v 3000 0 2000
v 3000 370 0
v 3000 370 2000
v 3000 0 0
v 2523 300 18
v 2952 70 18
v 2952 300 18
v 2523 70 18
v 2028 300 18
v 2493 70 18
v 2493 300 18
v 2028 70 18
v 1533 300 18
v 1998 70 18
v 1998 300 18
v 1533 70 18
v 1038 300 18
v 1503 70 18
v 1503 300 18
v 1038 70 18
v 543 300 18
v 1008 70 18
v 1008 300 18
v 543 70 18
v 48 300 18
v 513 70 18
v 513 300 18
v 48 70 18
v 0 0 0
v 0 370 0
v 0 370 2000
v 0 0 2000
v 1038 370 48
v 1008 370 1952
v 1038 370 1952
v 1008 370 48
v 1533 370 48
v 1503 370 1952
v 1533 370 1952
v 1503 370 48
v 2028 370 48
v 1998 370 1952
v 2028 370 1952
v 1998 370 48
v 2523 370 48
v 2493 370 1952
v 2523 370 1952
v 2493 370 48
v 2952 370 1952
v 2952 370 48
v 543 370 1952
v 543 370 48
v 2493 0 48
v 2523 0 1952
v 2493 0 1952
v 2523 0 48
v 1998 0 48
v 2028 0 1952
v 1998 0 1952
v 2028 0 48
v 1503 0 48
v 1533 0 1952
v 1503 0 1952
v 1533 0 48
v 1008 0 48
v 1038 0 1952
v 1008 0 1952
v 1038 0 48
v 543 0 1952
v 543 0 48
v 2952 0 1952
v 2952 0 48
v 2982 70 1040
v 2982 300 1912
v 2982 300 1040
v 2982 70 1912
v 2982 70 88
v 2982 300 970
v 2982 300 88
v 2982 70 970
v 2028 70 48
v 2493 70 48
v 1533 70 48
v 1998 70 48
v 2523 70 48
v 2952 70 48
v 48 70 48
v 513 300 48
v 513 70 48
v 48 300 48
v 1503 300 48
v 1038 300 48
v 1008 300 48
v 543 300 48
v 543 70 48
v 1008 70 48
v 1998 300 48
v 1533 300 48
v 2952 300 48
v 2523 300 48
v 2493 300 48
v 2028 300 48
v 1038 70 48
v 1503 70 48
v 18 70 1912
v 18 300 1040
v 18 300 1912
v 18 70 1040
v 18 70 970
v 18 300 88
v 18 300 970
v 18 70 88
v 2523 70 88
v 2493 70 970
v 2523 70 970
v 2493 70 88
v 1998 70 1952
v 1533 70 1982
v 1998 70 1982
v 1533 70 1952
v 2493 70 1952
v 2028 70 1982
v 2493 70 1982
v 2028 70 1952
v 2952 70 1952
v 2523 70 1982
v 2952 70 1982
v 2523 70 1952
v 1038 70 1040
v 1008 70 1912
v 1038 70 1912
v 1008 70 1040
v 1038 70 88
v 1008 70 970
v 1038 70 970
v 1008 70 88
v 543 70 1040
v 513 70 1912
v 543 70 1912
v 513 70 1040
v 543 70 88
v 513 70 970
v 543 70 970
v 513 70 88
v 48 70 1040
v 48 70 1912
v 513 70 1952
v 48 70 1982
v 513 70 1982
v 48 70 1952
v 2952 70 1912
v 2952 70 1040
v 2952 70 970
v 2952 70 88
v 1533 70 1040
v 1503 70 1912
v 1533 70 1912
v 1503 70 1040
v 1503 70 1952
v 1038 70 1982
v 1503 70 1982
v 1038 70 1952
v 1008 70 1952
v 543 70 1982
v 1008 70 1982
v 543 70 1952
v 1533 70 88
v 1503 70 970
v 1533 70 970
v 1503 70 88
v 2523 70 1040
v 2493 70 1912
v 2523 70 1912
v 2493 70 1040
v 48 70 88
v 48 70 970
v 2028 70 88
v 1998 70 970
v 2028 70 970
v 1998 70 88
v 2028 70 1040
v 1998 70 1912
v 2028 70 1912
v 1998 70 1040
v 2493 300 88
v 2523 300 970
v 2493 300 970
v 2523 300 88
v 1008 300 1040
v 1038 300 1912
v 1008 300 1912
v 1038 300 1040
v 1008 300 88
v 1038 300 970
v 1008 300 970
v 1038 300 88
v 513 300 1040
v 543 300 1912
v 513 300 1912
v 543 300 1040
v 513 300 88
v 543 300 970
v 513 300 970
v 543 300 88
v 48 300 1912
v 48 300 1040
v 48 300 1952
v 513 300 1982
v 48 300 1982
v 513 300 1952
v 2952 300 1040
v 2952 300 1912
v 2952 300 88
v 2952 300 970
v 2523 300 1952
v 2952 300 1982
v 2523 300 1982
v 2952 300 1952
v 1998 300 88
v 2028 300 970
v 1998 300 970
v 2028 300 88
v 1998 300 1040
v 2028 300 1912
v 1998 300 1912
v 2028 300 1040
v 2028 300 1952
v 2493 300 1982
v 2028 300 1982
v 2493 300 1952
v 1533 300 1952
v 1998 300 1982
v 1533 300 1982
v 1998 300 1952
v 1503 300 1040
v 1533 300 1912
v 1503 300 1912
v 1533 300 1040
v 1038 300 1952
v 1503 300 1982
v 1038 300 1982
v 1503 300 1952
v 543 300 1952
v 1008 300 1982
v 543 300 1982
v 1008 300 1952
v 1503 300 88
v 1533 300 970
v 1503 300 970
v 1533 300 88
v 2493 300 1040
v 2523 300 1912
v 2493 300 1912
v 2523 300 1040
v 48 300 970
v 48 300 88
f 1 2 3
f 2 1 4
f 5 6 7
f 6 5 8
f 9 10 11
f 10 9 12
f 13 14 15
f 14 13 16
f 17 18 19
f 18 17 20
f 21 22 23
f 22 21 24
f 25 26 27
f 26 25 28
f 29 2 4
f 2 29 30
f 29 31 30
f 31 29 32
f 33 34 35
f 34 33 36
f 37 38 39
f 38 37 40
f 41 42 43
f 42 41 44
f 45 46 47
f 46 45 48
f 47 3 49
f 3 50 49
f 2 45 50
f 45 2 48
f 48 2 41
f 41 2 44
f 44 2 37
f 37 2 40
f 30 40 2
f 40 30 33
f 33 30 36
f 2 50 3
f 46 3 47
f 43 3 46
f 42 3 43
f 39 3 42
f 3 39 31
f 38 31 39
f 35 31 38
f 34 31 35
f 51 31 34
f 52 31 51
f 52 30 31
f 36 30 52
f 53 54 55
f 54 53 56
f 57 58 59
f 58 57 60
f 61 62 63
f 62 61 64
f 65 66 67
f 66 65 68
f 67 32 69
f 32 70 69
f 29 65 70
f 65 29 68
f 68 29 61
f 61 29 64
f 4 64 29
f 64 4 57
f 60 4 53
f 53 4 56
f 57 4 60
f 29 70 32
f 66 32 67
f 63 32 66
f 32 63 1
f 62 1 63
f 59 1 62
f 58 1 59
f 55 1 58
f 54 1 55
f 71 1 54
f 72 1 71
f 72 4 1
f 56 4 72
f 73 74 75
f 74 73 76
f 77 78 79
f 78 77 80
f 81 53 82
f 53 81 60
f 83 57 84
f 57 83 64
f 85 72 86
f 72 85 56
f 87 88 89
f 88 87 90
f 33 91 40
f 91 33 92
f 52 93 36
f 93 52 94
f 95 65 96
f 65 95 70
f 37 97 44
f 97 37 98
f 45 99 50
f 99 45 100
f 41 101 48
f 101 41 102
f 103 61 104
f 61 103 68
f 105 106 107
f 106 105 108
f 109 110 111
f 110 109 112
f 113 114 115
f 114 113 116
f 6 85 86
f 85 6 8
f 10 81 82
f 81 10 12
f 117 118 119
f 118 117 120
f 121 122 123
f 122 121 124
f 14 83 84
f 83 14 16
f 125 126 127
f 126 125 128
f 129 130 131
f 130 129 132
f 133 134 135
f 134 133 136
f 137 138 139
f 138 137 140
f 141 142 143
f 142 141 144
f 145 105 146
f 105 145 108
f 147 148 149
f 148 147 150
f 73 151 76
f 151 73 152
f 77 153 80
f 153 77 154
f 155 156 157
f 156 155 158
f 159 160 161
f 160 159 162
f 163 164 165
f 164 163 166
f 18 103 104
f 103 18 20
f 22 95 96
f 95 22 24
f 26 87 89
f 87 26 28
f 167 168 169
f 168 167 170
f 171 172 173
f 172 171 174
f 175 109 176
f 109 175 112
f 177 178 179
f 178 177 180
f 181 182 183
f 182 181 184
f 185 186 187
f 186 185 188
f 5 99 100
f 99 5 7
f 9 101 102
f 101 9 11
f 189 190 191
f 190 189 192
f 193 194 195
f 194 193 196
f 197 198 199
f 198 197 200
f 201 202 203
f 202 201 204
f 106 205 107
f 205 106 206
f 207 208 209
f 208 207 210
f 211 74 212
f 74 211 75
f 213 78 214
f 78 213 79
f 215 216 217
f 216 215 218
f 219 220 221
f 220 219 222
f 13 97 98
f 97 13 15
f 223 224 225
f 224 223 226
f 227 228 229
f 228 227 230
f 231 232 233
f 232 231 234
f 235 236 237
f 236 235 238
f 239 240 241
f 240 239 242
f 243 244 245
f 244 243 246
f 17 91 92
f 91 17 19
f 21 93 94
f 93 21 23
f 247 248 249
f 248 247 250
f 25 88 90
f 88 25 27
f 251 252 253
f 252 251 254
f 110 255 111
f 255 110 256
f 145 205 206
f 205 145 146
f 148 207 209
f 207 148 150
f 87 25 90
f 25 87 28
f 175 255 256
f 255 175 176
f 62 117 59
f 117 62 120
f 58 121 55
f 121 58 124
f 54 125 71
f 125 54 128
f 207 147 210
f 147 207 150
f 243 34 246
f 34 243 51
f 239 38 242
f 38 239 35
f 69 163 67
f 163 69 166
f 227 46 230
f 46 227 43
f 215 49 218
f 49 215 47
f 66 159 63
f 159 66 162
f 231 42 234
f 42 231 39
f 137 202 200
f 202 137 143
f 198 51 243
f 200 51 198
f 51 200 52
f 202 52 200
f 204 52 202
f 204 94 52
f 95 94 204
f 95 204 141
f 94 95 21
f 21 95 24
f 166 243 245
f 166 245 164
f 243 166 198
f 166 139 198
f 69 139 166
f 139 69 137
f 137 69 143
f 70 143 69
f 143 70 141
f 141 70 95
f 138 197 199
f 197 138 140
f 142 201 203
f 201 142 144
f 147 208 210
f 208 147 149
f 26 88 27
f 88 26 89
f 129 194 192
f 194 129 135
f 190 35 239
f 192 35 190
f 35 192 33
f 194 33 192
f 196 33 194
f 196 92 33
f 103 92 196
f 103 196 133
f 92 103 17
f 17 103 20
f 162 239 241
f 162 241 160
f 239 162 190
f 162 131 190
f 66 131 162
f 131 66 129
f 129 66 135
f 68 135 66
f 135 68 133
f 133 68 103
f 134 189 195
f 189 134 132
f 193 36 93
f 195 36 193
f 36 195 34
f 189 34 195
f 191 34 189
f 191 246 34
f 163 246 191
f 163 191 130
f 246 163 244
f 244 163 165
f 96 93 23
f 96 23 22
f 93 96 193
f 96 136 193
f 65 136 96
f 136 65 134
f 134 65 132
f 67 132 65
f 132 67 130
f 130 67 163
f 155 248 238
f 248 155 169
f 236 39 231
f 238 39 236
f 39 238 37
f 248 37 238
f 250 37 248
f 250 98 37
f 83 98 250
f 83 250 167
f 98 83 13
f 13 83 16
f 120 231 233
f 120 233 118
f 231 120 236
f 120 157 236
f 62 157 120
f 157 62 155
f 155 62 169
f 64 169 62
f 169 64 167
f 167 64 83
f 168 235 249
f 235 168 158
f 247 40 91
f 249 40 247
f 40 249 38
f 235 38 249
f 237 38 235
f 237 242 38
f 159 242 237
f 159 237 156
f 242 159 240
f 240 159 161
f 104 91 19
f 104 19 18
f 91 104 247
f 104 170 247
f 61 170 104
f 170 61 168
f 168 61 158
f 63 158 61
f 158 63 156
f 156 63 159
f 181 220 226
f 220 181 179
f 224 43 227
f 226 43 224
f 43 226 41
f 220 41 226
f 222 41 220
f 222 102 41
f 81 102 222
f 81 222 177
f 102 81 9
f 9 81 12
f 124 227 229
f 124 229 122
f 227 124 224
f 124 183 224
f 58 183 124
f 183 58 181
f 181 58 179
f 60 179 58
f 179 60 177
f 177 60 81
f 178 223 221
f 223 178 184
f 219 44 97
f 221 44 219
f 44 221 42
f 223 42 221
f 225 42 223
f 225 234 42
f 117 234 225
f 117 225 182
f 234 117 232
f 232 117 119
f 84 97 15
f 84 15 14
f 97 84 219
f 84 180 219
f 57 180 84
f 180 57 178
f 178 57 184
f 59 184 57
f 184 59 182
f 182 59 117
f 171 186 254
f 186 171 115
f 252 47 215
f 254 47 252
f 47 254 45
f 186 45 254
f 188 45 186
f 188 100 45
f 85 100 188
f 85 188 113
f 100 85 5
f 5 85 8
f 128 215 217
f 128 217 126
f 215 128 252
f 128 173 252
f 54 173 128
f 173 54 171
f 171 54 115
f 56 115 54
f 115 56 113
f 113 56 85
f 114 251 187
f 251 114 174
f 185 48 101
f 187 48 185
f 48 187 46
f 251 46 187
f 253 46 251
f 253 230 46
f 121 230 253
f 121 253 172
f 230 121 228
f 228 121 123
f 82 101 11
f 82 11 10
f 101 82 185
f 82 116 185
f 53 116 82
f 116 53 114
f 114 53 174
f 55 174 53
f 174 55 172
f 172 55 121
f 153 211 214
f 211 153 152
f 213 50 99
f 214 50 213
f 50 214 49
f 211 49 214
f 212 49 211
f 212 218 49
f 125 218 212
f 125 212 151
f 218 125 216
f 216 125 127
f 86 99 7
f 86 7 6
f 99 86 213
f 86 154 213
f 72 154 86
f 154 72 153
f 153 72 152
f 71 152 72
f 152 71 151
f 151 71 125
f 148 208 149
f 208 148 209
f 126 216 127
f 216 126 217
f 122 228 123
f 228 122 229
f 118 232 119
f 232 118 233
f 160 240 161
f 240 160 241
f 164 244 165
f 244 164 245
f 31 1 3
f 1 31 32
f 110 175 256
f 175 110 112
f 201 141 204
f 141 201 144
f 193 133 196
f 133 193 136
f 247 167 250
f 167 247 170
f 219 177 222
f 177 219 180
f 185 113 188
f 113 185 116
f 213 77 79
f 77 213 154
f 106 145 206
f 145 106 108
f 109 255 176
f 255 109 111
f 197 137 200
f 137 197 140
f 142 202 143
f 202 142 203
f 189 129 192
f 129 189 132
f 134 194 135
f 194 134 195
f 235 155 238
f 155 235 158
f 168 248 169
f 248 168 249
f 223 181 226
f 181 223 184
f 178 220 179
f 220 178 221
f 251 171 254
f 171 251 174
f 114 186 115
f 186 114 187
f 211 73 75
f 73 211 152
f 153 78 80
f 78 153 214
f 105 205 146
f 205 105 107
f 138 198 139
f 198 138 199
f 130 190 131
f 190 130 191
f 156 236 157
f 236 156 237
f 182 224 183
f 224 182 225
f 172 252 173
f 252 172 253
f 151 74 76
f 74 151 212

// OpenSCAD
// Archiyou -> OpenSCAD  |  script: strawwall  |  units: mm
// OpenSCAD has no units: coordinates are in mm.
// Parts: 48 CSG, 0 baked, 0 2D
// Skipped: gridline (open curve), gridline11 (open curve), gridline21 (open curve), gridline31 (open curve), gridline41 (open curve), gridline51 (open curve), gridline61 (open curve), gridline71 (open curve)
// Parameters at export, for reference only (nothing in this file is linked to them):
//   LENGTH = 300
//   HEIGHT = 200
//   SYSTEM = "RFCP-2"
//   BALE_THICKNESS = 370
//   BALE_WIDTH = 470
//   BALE_LENGTH = 600
//   BEAM_SECTION_AUTO = true
//   BEAM_SECTION_WIDTH = 35
//   BEAM_SECTION_HEIGHT = 70
//   HIDE_BALES = false

$fn = 32;
PART = "";

// bottom board  (layer bottomplate)
module bottom_board() {
    color([0.647, 0.165, 0.165]) translate([1500, 185, 9]) cube([3000, 370, 18], center = true);
}

// bottom plate  (layer bottomplate)
module bottom_plate() {
    color([0, 0.502, 0]) translate([1500, 35, 33]) cube([2964, 70, 30], center = true);
}

// bottom plate back  (layer bottomplate)
module bottom_plate_back() {
    color([0, 0.502, 0]) translate([1500, 335, 33]) cube([2964, 70, 30], center = true);
}

// stud11  (layer studs)
module stud11() {
    color([0, 0, 1]) translate([33, 35, 1000]) cube([30, 70, 1904], center = true);
}

// stud21  (layer studs)
module stud21() {
    color([0, 0, 1]) translate([528, 35, 1000]) cube([30, 70, 1904], center = true);
}

// stud31  (layer studs)
module stud31() {
    color([0, 0, 1]) translate([1023, 35, 1000]) cube([30, 70, 1904], center = true);
}

// stud41  (layer studs)
module stud41() {
    color([0, 0, 1]) translate([1518, 35, 1000]) cube([30, 70, 1904], center = true);
}

// stud51  (layer studs)
module stud51() {
    color([0, 0, 1]) translate([2013, 35, 1000]) cube([30, 70, 1904], center = true);
}

// stud61  (layer studs)
module stud61() {
    color([0, 0, 1]) translate([2508, 35, 1000]) cube([30, 70, 1904], center = true);
}

// studBack  (layer studs)
module studBack() {
    color([0, 0, 1]) translate([33, 335, 1000]) cube([30, 70, 1904], center = true);
}

// stud11  (layer studs)
module stud11_2() {
    color([0, 0, 1]) translate([33, 335, 1000]) cube([30, 70, 1904], center = true);
}

// stud21  (layer studs)
module stud21_2() {
    color([0, 0, 1]) translate([528, 335, 1000]) cube([30, 70, 1904], center = true);
}

// stud31  (layer studs)
module stud31_2() {
    color([0, 0, 1]) translate([1023, 335, 1000]) cube([30, 70, 1904], center = true);
}

// stud41  (layer studs)
module stud41_2() {
    color([0, 0, 1]) translate([1518, 335, 1000]) cube([30, 70, 1904], center = true);
}

// stud51  (layer studs)
module stud51_2() {
    color([0, 0, 1]) translate([2013, 335, 1000]) cube([30, 70, 1904], center = true);
}

// stud61  (layer studs)
module stud61_2() {
    color([0, 0, 1]) translate([2508, 335, 1000]) cube([30, 70, 1904], center = true);
}

// lastStudFront  (layer studs)
module lastStudFront() {
    color([0.502, 0, 0.502]) translate([2967, 35, 1000]) cube([30, 70, 1904], center = true);
}

// lastStudBack  (layer studs)
module lastStudBack() {
    color([0.502, 0, 0.502]) translate([2967, 335, 1000]) cube([30, 70, 1904], center = true);
}

// side board  (layer sideboards)
module side_board() {
    color([0.647, 0.165, 0.165]) translate([9, 185, 1000]) cube([18, 370, 1964], center = true);
}

// side board  (layer sideboards)
module side_board_2() {
    color([0.647, 0.165, 0.165]) translate([2991, 185, 1000]) cube([18, 370, 1964], center = true);
}

// bottom board  (layer topplate)
module bottom_board_2() {
    color([0.647, 0.165, 0.165]) multmatrix([[1, 0, 0, 1500], [0, 1, 0, 185], [0, 0, -1, 1991], [0, 0, 0, 1]]) cube([3000, 370, 18], center = true);
}

// bottom plate  (layer topplate)
module bottom_plate_2() {
    multmatrix([[1, 0, 0, 1500], [0, 1, 0, 35], [0, 0, -1, 1967], [0, 0, 0, 1]]) cube([2964, 70, 30], center = true);
}

// bottom plate back  (layer topplate)
module bottom_plate_back_2() {
    multmatrix([[1, 0, 0, 1500], [0, 1, 0, 335], [0, 0, -1, 1967], [0, 0, 0, 1]]) cube([2964, 70, 30], center = true);
}

// stud brace11  (layer braces)
module stud_brace11() {
    color([0, 0, 0.392]) translate([33, 185, 53]) cube([30, 230, 70], center = true);
}

// stud brace21  (layer braces)
module stud_brace21() {
    color([0, 0, 0.392]) translate([528, 185, 53]) cube([30, 230, 70], center = true);
}

// stud brace31  (layer braces)
module stud_brace31() {
    color([0, 0, 0.392]) translate([1023, 185, 53]) cube([30, 230, 70], center = true);
}

// stud brace41  (layer braces)
module stud_brace41() {
    color([0, 0, 0.392]) translate([1518, 185, 53]) cube([30, 230, 70], center = true);
}

// stud brace51  (layer braces)
module stud_brace51() {
    color([0, 0, 0.392]) translate([2013, 185, 53]) cube([30, 230, 70], center = true);
}

// stud brace61  (layer braces)
module stud_brace61() {
    color([0, 0, 0.392]) translate([2508, 185, 53]) cube([30, 230, 70], center = true);
}

// lastBraceBottom  (layer braces)
module lastBraceBottom() {
    color([0, 0, 0.392]) translate([2967, 185, 53]) cube([30, 230, 70], center = true);
}

// stud brace11  (layer braces)
module stud_brace11_2() {
    color([0, 0, 0.392]) translate([33, 185, 1005]) cube([30, 230, 70], center = true);
}

// stud brace21  (layer braces)
module stud_brace21_2() {
    color([0, 0, 0.392]) translate([528, 185, 1005]) cube([30, 230, 70], center = true);
}

// stud brace31  (layer braces)
module stud_brace31_2() {
    color([0, 0, 0.392]) translate([1023, 185, 1005]) cube([30, 230, 70], center = true);
}

// stud brace41  (layer braces)
module stud_brace41_2() {
    color([0, 0, 0.392]) translate([1518, 185, 1005]) cube([30, 230, 70], center = true);
}

// stud brace51  (layer braces)
module stud_brace51_2() {
    color([0, 0, 0.392]) translate([2013, 185, 1005]) cube([30, 230, 70], center = true);
}

// stud brace61  (layer braces)
module stud_brace61_2() {
    color([0, 0, 0.392]) translate([2508, 185, 1005]) cube([30, 230, 70], center = true);
}

// lastBraceBottom  (layer braces)
module lastBraceBottom_2() {
    color([0, 0, 0.392]) translate([2967, 185, 1005]) cube([30, 230, 70], center = true);
}

// stud brace11  (layer braces)
module stud_brace11_3() {
    color([0, 0, 0.392]) multmatrix([[1, 0, 0, 33], [0, 1, 0, 185], [0, 0, -1, 1947], [0, 0, 0, 1]]) cube([30, 230, 70], center = true);
}

// stud brace21  (layer braces)
module stud_brace21_3() {
    color([0, 0, 0.392]) multmatrix([[1, 0, 0, 528], [0, 1, 0, 185], [0, 0, -1, 1947], [0, 0, 0, 1]]) cube([30, 230, 70], center = true);
}

// stud brace31  (layer braces)
module stud_brace31_3() {
    color([0, 0, 0.392]) multmatrix([[1, 0, 0, 1023], [0, 1, 0, 185], [0, 0, -1, 1947], [0, 0, 0, 1]]) cube([30, 230, 70], center = true);
}

// stud brace41  (layer braces)
module stud_brace41_3() {
    color([0, 0, 0.392]) multmatrix([[1, 0, 0, 1518], [0, 1, 0, 185], [0, 0, -1, 1947], [0, 0, 0, 1]]) cube([30, 230, 70], center = true);
}

// stud brace51  (layer braces)
module stud_brace51_3() {
    color([0, 0, 0.392]) multmatrix([[1, 0, 0, 2013], [0, 1, 0, 185], [0, 0, -1, 1947], [0, 0, 0, 1]]) cube([30, 230, 70], center = true);
}

// stud brace61  (layer braces)
module stud_brace61_3() {
    color([0, 0, 0.392]) multmatrix([[1, 0, 0, 2508], [0, 1, 0, 185], [0, 0, -1, 1947], [0, 0, 0, 1]]) cube([30, 230, 70], center = true);
}

// lastBraceBottom  (layer braces)
module lastBraceBottom_3() {
    color([0, 0, 0.392]) multmatrix([[1, 0, 0, 2967], [0, 1, 0, 185], [0, 0, -1, 1947], [0, 0, 0, 1]]) cube([30, 230, 70], center = true);
}

// bale111  (layer bales)
module bale111() {
    color([1, 1, 0]) translate([280.5, 185, 348]) cube([465, 370, 600], center = true);
}

// bale112  (layer bales)
module bale112() {
    color([1, 1, 0]) translate([280.5, 185, 948]) cube([465, 370, 600], center = true);
}

// bale113  (layer bales)
module bale113() {
    color([1, 1, 0]) translate([280.5, 185, 1548]) cube([465, 370, 600], center = true);
}

// bale cut  (layer bales)
module bale_cut() {
    color([1, 1, 0]) translate([280.5, 185, 1900]) cube([465, 370, 104], center = true);
}

// 3D parts
if (PART == "" || PART == "bottom_board") bottom_board();
if (PART == "" || PART == "bottom_plate") bottom_plate();
if (PART == "" || PART == "bottom_plate_back") bottom_plate_back();
if (PART == "" || PART == "stud11") stud11();
if (PART == "" || PART == "stud21") stud21();
if (PART == "" || PART == "stud31") stud31();
if (PART == "" || PART == "stud41") stud41();
if (PART == "" || PART == "stud51") stud51();
if (PART == "" || PART == "stud61") stud61();
if (PART == "" || PART == "studBack") studBack();
if (PART == "" || PART == "stud11_2") stud11_2();
if (PART == "" || PART == "stud21_2") stud21_2();
if (PART == "" || PART == "stud31_2") stud31_2();
if (PART == "" || PART == "stud41_2") stud41_2();
if (PART == "" || PART == "stud51_2") stud51_2();
if (PART == "" || PART == "stud61_2") stud61_2();
if (PART == "" || PART == "lastStudFront") lastStudFront();
if (PART == "" || PART == "lastStudBack") lastStudBack();
if (PART == "" || PART == "side_board") side_board();
if (PART == "" || PART == "side_board_2") side_board_2();
if (PART == "" || PART == "bottom_board_2") bottom_board_2();
if (PART == "" || PART == "bottom_plate_2") bottom_plate_2();
if (PART == "" || PART == "bottom_plate_back_2") bottom_plate_back_2();
if (PART == "" || PART == "stud_brace11") stud_brace11();
if (PART == "" || PART == "stud_brace21") stud_brace21();
if (PART == "" || PART == "stud_brace31") stud_brace31();
if (PART == "" || PART == "stud_brace41") stud_brace41();
if (PART == "" || PART == "stud_brace51") stud_brace51();
if (PART == "" || PART == "stud_brace61") stud_brace61();
if (PART == "" || PART == "lastBraceBottom") lastBraceBottom();
if (PART == "" || PART == "stud_brace11_2") stud_brace11_2();
if (PART == "" || PART == "stud_brace21_2") stud_brace21_2();
if (PART == "" || PART == "stud_brace31_2") stud_brace31_2();
if (PART == "" || PART == "stud_brace41_2") stud_brace41_2();
if (PART == "" || PART == "stud_brace51_2") stud_brace51_2();
if (PART == "" || PART == "stud_brace61_2") stud_brace61_2();
if (PART == "" || PART == "lastBraceBottom_2") lastBraceBottom_2();
if (PART == "" || PART == "stud_brace11_3") stud_brace11_3();
if (PART == "" || PART == "stud_brace21_3") stud_brace21_3();
if (PART == "" || PART == "stud_brace31_3") stud_brace31_3();
if (PART == "" || PART == "stud_brace41_3") stud_brace41_3();
if (PART == "" || PART == "stud_brace51_3") stud_brace51_3();
if (PART == "" || PART == "stud_brace61_3") stud_brace61_3();
if (PART == "" || PART == "lastBraceBottom_3") lastBraceBottom_3();
if (PART == "" || PART == "bale111") bale111();
if (PART == "" || PART == "bale112") bale112();
if (PART == "" || PART == "bale113") bale113();
if (PART == "" || PART == "bale_cut") bale_cut();
